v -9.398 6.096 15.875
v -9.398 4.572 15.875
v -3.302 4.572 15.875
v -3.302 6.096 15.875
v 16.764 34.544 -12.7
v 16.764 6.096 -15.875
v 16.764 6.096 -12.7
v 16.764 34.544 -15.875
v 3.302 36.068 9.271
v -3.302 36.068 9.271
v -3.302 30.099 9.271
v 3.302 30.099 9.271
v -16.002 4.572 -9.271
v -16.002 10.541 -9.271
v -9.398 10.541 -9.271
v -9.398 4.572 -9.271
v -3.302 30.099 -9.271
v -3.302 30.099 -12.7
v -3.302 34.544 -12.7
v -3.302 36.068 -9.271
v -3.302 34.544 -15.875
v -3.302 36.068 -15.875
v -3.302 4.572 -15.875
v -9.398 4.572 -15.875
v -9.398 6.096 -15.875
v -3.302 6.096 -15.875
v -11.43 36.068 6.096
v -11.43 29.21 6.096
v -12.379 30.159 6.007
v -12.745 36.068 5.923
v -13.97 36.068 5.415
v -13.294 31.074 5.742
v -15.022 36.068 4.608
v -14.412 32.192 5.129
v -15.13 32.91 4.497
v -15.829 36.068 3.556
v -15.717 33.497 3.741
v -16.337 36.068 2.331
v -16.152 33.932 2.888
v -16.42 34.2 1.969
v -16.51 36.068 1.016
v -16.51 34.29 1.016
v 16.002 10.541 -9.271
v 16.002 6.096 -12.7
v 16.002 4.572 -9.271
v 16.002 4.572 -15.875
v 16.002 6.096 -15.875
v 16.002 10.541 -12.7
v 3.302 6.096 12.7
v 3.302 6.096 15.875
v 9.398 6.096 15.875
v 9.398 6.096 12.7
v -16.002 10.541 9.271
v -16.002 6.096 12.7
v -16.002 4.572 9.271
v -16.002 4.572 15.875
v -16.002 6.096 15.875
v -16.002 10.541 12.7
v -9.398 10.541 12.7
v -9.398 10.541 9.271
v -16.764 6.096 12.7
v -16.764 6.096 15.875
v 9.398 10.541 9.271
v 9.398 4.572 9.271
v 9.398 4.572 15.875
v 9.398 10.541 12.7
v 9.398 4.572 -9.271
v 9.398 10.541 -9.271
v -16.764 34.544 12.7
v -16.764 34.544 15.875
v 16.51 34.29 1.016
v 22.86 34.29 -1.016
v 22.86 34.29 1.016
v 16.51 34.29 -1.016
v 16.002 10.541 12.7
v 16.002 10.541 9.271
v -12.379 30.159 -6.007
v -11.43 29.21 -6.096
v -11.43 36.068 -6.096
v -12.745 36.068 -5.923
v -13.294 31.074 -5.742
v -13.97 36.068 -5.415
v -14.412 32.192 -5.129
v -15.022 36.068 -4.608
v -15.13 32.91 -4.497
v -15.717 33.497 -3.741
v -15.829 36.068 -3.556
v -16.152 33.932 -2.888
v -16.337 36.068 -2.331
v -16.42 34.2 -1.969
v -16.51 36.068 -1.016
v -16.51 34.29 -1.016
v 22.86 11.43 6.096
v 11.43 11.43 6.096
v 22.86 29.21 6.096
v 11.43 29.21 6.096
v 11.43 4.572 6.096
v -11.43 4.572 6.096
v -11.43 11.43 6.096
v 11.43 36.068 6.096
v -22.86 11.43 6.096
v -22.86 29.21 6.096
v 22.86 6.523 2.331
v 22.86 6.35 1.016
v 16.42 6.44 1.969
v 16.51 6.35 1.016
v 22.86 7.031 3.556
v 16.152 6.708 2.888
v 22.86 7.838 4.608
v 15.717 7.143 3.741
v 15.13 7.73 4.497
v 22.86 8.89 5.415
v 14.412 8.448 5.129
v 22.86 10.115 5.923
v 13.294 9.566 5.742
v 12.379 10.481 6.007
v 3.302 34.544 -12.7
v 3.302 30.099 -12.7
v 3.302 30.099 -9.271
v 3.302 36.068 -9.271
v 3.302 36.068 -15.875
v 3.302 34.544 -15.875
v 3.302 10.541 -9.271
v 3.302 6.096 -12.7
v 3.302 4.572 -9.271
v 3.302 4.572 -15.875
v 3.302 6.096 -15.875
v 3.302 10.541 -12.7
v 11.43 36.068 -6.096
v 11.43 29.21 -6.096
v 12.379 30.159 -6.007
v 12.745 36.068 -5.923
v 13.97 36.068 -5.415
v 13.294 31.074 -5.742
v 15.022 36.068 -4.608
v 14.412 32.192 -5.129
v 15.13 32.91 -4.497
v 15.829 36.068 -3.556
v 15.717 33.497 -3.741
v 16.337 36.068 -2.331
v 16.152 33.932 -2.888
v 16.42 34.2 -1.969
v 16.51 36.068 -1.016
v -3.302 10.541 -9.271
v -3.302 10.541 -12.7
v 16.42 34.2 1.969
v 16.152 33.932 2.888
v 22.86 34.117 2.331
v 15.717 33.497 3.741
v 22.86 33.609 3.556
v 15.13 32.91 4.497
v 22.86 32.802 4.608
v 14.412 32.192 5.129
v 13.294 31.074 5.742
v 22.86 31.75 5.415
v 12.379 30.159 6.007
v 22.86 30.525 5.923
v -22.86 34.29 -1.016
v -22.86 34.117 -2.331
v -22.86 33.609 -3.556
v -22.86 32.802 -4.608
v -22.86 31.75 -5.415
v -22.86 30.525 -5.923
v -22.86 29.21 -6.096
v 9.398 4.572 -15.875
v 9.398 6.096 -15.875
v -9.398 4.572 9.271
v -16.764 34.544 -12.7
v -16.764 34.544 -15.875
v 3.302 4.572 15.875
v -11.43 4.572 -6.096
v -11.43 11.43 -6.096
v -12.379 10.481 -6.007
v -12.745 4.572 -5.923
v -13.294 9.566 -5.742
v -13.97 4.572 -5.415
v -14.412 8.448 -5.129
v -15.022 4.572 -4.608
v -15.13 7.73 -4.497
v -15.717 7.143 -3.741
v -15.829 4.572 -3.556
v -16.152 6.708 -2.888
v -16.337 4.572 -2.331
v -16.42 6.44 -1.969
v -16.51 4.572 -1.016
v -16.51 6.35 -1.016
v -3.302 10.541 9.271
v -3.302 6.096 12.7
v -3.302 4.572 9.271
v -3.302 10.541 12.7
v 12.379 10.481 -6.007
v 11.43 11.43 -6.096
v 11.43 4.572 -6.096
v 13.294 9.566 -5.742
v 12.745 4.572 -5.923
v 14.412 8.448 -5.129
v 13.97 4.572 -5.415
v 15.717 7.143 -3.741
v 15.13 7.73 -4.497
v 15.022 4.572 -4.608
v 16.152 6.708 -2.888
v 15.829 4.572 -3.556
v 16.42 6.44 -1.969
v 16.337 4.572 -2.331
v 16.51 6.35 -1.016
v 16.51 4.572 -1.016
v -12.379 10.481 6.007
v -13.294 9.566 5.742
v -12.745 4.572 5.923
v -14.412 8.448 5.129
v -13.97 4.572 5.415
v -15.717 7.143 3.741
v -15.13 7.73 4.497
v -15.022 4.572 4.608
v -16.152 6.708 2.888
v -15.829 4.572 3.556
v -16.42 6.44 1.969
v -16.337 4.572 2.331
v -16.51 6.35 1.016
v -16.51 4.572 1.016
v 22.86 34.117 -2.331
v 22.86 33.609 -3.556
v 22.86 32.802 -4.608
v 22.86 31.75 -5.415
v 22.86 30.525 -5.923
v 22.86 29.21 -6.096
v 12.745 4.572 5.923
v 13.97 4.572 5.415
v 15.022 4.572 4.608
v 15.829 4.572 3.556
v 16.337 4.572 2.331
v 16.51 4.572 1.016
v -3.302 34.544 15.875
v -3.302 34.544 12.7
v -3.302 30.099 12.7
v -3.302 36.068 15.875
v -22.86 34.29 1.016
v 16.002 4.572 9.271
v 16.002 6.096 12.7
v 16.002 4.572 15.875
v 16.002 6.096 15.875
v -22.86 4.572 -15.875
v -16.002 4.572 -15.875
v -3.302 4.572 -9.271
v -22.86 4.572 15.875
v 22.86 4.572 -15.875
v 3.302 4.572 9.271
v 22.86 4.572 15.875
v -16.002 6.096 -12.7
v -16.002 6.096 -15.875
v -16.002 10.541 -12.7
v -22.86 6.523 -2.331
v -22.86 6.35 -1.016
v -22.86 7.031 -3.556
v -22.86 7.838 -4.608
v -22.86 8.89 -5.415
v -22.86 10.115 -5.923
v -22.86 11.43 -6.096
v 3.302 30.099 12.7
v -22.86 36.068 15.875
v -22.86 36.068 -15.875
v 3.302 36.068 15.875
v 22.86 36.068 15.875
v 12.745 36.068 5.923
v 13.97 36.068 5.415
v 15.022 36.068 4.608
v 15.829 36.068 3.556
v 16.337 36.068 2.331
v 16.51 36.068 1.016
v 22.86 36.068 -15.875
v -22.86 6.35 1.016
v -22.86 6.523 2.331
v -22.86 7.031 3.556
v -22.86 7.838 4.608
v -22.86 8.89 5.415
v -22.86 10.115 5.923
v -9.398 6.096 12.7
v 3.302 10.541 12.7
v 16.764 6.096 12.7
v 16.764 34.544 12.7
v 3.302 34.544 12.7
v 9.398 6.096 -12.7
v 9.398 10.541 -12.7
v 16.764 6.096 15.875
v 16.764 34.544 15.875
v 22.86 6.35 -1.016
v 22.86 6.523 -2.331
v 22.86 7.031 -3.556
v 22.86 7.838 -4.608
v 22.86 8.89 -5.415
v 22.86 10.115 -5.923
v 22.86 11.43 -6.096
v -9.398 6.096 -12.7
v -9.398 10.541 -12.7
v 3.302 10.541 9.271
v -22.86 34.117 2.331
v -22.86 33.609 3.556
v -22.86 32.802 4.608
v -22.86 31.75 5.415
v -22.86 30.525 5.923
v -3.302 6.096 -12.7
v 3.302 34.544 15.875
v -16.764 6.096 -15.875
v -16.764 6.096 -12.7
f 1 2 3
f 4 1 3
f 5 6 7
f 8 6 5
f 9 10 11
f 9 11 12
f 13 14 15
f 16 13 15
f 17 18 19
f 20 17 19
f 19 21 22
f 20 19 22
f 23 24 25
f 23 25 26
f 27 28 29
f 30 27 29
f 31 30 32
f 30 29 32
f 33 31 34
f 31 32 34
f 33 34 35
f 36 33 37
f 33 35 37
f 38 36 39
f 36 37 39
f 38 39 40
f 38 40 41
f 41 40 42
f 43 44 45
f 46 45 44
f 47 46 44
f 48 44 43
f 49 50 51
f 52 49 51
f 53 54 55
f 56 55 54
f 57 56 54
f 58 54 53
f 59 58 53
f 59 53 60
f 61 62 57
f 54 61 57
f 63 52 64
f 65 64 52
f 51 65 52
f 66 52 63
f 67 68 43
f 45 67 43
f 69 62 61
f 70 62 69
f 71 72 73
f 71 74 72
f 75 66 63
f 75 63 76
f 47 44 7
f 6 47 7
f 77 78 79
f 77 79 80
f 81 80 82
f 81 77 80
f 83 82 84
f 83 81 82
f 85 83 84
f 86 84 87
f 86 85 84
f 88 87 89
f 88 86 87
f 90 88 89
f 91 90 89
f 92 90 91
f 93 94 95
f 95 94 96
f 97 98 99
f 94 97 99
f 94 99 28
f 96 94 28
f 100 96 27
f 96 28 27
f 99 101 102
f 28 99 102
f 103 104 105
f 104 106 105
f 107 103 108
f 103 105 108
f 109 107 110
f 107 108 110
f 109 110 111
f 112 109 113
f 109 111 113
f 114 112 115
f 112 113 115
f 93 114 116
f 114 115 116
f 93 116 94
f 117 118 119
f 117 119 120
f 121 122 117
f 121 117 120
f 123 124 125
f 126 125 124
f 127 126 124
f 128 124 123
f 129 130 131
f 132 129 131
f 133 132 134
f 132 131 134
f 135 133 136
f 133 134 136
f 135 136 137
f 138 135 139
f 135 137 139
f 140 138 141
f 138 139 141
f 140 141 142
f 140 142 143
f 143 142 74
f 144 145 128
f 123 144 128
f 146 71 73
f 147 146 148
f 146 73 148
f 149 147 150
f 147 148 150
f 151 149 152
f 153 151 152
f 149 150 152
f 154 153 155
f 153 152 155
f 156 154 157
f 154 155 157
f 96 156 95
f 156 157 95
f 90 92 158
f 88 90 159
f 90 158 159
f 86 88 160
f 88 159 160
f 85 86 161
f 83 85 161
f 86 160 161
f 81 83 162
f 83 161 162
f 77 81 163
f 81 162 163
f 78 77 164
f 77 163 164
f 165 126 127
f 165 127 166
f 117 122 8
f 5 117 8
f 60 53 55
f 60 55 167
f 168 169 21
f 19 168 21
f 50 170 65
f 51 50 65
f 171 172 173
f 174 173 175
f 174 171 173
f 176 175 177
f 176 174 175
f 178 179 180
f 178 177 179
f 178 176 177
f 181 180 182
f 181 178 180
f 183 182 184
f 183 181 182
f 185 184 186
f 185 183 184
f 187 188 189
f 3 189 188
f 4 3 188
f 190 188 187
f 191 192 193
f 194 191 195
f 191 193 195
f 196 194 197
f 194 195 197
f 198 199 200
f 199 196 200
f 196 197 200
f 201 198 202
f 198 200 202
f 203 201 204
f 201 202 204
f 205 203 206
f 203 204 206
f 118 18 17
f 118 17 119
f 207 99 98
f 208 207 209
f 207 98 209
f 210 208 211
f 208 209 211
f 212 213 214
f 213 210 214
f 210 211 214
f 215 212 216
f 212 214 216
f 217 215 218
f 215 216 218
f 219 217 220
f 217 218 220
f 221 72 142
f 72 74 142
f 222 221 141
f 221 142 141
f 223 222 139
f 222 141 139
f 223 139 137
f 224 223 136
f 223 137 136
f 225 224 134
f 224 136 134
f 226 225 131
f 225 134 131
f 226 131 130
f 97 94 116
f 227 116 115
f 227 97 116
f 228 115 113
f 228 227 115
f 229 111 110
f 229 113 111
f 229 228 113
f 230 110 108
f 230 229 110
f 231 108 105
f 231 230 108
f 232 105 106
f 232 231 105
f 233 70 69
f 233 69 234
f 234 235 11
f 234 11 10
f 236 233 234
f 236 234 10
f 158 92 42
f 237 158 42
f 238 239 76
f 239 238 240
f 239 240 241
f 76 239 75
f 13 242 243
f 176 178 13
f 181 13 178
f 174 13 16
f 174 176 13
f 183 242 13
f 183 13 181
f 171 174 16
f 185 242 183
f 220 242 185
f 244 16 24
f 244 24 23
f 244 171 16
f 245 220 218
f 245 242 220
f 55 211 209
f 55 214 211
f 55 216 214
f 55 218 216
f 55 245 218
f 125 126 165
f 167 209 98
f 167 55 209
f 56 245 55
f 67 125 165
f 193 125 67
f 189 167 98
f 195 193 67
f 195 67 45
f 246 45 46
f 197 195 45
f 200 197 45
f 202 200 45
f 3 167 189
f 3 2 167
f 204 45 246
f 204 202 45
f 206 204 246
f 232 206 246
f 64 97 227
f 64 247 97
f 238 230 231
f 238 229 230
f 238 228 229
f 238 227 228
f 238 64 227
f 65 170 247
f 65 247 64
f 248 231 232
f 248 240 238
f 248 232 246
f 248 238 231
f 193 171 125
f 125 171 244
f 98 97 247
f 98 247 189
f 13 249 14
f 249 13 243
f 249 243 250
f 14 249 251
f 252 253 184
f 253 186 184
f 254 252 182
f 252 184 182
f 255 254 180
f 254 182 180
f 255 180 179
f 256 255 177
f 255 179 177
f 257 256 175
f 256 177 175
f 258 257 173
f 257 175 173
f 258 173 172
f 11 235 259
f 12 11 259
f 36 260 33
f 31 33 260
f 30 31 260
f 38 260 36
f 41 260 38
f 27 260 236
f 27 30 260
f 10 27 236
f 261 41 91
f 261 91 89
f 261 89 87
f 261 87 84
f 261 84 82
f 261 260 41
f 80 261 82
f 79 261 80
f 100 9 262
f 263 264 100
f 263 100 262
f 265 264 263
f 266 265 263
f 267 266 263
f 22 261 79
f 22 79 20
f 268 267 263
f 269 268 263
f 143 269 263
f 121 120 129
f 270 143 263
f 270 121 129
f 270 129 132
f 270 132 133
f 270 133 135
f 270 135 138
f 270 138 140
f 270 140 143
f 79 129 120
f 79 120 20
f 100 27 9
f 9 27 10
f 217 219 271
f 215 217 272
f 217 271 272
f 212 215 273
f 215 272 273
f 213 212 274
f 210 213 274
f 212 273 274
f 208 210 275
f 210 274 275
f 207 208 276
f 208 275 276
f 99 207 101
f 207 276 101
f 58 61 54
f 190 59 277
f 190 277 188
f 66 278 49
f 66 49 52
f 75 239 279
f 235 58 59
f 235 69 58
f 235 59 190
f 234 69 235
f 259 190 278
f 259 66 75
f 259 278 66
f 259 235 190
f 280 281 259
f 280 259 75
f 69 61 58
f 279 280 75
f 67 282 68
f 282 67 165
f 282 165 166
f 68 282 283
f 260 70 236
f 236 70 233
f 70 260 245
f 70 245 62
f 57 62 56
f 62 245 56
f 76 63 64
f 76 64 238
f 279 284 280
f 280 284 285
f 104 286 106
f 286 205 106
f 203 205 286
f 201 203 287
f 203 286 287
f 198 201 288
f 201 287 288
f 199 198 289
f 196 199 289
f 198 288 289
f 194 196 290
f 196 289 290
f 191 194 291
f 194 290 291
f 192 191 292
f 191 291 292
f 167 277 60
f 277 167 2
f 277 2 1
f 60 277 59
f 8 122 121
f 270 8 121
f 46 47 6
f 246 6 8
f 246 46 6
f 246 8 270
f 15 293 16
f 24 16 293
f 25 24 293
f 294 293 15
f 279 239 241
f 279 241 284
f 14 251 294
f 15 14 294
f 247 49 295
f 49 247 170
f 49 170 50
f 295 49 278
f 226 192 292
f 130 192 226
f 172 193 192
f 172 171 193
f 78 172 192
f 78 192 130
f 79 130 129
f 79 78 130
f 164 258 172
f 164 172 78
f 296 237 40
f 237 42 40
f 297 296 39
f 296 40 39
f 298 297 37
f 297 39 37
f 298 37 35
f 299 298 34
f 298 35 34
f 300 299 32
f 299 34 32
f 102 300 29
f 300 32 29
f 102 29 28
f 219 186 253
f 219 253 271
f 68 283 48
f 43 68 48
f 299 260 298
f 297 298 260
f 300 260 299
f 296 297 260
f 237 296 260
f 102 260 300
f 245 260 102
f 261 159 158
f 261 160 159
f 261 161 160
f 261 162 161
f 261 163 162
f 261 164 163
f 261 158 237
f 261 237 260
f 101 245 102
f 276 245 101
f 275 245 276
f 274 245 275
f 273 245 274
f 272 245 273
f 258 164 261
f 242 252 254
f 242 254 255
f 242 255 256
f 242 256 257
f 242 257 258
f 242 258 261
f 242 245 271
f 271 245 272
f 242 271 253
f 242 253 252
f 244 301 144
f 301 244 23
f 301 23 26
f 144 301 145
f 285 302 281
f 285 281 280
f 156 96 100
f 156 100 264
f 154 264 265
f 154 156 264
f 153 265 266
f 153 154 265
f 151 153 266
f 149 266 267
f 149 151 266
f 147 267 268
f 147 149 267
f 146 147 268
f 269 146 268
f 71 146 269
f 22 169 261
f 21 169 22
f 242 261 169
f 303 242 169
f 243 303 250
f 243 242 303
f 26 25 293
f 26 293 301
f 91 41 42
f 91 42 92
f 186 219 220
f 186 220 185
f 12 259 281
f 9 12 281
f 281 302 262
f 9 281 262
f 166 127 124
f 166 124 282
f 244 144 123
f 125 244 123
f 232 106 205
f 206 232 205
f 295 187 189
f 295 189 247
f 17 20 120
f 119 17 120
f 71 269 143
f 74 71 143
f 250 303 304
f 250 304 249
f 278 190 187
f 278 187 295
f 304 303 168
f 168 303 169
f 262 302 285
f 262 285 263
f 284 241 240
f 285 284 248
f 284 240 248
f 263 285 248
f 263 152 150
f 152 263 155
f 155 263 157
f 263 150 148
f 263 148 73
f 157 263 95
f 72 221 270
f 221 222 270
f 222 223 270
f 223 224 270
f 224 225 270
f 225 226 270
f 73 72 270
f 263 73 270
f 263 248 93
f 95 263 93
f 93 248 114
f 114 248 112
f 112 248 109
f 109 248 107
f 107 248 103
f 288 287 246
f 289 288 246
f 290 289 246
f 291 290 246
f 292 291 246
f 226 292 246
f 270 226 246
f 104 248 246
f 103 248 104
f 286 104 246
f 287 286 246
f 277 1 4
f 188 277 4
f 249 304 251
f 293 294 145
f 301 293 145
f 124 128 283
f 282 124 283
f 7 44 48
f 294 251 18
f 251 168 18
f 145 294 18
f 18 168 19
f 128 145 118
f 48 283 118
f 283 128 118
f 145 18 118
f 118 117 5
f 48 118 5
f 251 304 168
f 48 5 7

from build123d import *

# Parameters (mm, degrees)
SKETCH1_W           = 45.72
SKETCH1_H           = 31.75
BOSS_EXTRUDE1_DEPTH = 40.64
SKETCH2_W           = 33.528
SKETCH2_H           = 28.448
CUT_EXTRUDE1_DEPTH  = 3.175
SKETCH3_W           = 6.604
SKETCH3_H           = 6.096
CUT_EXTRUDE2_DEPTH  = 6.604
SKETCH4_W           = 6.604
SKETCH4_H           = 4.445
CUT_EXTRUDE3_DEPTH  = 3.429
SKETCH5_W           = 33.02
SKETCH5_H           = 12.192
CUT_EXTRUDE4_DEPTH  = 50.256520634
SKETCH6_W           = 12.192
SKETCH6_H           = 27.94
CUT_EXTRUDE5_DEPTH  = 64.197655218
FILLET1_R           = 5.08
FILLET2_R           = 5.08
SKETCH7_W           = 45.72
SKETCH7_H           = 31.75
CUT_EXTRUDE6_DEPTH  = 4.572
SKETCH8_W           = 45.72
SKETCH8_H           = 31.75
CUT_EXTRUDE7_DEPTH  = 4.572


with BuildPart() as part:
    # Sketch1 → Boss-Extrude1 (new body)
    with BuildSketch(Plane(origin=(0, 0, 0), x_dir=(1, 0, 0), z_dir=(0, 1, 0))):
        Rectangle(SKETCH1_W, SKETCH1_H)
    extrude(amount=BOSS_EXTRUDE1_DEPTH)

    # Sketch2 → Cut-Extrude1 (cut)
    with BuildSketch(Plane.XY.offset(15.875)):
        with Locations((0, 20.32)):
            Rectangle(SKETCH2_W, SKETCH2_H)
    cut_extrude1 = extrude(amount=-CUT_EXTRUDE1_DEPTH, mode=Mode.SUBTRACT)

    # Sketch3 → Cut-Extrude2 (cut)
    with BuildSketch(Plane.XY.offset(15.875)):
        with Locations((0, 37.592)):
            Rectangle(SKETCH3_W, SKETCH3_H)
        with Locations((0, 3.048)):
            Rectangle(SKETCH3_W, SKETCH3_H)
        with Locations((-12.7, 3.048)):
            Rectangle(SKETCH3_W, SKETCH3_H)
        with Locations((12.7, 3.048)):
            Rectangle(SKETCH3_W, SKETCH3_H)
    cut_extrude2 = extrude(amount=-CUT_EXTRUDE2_DEPTH, mode=Mode.SUBTRACT)

    # Sketch4 → Cut-Extrude3 (cut)
    with BuildSketch(Plane.XY.offset(12.7)):
        with Locations((0, 32.3215)):
            Rectangle(SKETCH4_W, SKETCH4_H)
        with Locations((-12.7, 8.3185)):
            Rectangle(SKETCH4_W, SKETCH4_H)
        with Locations((0, 8.3185)):
            Rectangle(SKETCH4_W, SKETCH4_H)
        with Locations((12.7, 8.3185)):
            Rectangle(SKETCH4_W, SKETCH4_H)
    cut_extrude3 = extrude(amount=-CUT_EXTRUDE3_DEPTH, mode=Mode.SUBTRACT)

    # Mirror1: Cut-Extrude1, Cut-Extrude2, Cut-Extrude3 across plane
    add(cut_extrude1.mirror(Plane.XY), mode=Mode.SUBTRACT)
    add(cut_extrude2.mirror(Plane.XY), mode=Mode.SUBTRACT)
    add(cut_extrude3.mirror(Plane.XY), mode=Mode.SUBTRACT)

    # Sketch5 → Cut-Extrude4 (cut, through all)
    with BuildSketch(Plane(origin=(0, 40.64, 0), x_dir=(1, 0, 0), z_dir=(0, 1, 0))):
        Rectangle(SKETCH5_W, SKETCH5_H)
    extrude(amount=-CUT_EXTRUDE4_DEPTH, mode=Mode.SUBTRACT)

    # Sketch6 → Cut-Extrude5 (cut, through all)
    with BuildSketch(Plane.ZY.offset(22.86)):
        with Locations((0, 20.32)):
            Rectangle(SKETCH6_W, SKETCH6_H)
    extrude(amount=-CUT_EXTRUDE5_DEPTH, mode=Mode.SUBTRACT)

    # Fillet1
    fillet1_edges = [part.edges().sort_by_distance(p)[0] for p in [
        (16.51, 3.175, -6.096),
        (16.51, 3.175, 6.096),
        (-16.51, 3.175, 6.096),
        (-16.51, 3.175, -6.096),
        (-16.51, 37.465, -6.096),
        (16.51, 37.465, -6.096),
        (-16.51, 37.465, 6.096),
        (16.51, 37.465, 6.096),
    ]]
    fillet(fillet1_edges, radius=FILLET1_R)

    # Fillet2
    fillet2_edges = [part.edges().sort_by_distance(p)[0] for p in [
        (-17.145, 6.35, 6.096),
        (-17.145, 6.35, -6.096),
        (-17.145, 34.29, 6.096),
        (-17.145, 34.29, -6.096),
        (17.145, 34.29, 6.096),
        (17.145, 34.29, -6.096),
        (17.145, 6.35, 6.096),
        (17.145, 6.35, -6.096),
    ]]
    fillet(fillet2_edges, radius=FILLET2_R)

    # Sketch7 → Cut-Extrude6 (cut)
    with BuildSketch(Plane(origin=(0, 40.64, 0), x_dir=(1, 0, 0), z_dir=(0, 1, 0))):
        Rectangle(SKETCH7_W, SKETCH7_H)
    extrude(amount=-CUT_EXTRUDE6_DEPTH, mode=Mode.SUBTRACT)

    # Sketch8 → Cut-Extrude7 (cut)
    with BuildSketch(Plane.XZ):
        Rectangle(SKETCH8_W, SKETCH8_H)
    extrude(amount=-CUT_EXTRUDE7_DEPTH, mode=Mode.SUBTRACT)


solid = part.part
